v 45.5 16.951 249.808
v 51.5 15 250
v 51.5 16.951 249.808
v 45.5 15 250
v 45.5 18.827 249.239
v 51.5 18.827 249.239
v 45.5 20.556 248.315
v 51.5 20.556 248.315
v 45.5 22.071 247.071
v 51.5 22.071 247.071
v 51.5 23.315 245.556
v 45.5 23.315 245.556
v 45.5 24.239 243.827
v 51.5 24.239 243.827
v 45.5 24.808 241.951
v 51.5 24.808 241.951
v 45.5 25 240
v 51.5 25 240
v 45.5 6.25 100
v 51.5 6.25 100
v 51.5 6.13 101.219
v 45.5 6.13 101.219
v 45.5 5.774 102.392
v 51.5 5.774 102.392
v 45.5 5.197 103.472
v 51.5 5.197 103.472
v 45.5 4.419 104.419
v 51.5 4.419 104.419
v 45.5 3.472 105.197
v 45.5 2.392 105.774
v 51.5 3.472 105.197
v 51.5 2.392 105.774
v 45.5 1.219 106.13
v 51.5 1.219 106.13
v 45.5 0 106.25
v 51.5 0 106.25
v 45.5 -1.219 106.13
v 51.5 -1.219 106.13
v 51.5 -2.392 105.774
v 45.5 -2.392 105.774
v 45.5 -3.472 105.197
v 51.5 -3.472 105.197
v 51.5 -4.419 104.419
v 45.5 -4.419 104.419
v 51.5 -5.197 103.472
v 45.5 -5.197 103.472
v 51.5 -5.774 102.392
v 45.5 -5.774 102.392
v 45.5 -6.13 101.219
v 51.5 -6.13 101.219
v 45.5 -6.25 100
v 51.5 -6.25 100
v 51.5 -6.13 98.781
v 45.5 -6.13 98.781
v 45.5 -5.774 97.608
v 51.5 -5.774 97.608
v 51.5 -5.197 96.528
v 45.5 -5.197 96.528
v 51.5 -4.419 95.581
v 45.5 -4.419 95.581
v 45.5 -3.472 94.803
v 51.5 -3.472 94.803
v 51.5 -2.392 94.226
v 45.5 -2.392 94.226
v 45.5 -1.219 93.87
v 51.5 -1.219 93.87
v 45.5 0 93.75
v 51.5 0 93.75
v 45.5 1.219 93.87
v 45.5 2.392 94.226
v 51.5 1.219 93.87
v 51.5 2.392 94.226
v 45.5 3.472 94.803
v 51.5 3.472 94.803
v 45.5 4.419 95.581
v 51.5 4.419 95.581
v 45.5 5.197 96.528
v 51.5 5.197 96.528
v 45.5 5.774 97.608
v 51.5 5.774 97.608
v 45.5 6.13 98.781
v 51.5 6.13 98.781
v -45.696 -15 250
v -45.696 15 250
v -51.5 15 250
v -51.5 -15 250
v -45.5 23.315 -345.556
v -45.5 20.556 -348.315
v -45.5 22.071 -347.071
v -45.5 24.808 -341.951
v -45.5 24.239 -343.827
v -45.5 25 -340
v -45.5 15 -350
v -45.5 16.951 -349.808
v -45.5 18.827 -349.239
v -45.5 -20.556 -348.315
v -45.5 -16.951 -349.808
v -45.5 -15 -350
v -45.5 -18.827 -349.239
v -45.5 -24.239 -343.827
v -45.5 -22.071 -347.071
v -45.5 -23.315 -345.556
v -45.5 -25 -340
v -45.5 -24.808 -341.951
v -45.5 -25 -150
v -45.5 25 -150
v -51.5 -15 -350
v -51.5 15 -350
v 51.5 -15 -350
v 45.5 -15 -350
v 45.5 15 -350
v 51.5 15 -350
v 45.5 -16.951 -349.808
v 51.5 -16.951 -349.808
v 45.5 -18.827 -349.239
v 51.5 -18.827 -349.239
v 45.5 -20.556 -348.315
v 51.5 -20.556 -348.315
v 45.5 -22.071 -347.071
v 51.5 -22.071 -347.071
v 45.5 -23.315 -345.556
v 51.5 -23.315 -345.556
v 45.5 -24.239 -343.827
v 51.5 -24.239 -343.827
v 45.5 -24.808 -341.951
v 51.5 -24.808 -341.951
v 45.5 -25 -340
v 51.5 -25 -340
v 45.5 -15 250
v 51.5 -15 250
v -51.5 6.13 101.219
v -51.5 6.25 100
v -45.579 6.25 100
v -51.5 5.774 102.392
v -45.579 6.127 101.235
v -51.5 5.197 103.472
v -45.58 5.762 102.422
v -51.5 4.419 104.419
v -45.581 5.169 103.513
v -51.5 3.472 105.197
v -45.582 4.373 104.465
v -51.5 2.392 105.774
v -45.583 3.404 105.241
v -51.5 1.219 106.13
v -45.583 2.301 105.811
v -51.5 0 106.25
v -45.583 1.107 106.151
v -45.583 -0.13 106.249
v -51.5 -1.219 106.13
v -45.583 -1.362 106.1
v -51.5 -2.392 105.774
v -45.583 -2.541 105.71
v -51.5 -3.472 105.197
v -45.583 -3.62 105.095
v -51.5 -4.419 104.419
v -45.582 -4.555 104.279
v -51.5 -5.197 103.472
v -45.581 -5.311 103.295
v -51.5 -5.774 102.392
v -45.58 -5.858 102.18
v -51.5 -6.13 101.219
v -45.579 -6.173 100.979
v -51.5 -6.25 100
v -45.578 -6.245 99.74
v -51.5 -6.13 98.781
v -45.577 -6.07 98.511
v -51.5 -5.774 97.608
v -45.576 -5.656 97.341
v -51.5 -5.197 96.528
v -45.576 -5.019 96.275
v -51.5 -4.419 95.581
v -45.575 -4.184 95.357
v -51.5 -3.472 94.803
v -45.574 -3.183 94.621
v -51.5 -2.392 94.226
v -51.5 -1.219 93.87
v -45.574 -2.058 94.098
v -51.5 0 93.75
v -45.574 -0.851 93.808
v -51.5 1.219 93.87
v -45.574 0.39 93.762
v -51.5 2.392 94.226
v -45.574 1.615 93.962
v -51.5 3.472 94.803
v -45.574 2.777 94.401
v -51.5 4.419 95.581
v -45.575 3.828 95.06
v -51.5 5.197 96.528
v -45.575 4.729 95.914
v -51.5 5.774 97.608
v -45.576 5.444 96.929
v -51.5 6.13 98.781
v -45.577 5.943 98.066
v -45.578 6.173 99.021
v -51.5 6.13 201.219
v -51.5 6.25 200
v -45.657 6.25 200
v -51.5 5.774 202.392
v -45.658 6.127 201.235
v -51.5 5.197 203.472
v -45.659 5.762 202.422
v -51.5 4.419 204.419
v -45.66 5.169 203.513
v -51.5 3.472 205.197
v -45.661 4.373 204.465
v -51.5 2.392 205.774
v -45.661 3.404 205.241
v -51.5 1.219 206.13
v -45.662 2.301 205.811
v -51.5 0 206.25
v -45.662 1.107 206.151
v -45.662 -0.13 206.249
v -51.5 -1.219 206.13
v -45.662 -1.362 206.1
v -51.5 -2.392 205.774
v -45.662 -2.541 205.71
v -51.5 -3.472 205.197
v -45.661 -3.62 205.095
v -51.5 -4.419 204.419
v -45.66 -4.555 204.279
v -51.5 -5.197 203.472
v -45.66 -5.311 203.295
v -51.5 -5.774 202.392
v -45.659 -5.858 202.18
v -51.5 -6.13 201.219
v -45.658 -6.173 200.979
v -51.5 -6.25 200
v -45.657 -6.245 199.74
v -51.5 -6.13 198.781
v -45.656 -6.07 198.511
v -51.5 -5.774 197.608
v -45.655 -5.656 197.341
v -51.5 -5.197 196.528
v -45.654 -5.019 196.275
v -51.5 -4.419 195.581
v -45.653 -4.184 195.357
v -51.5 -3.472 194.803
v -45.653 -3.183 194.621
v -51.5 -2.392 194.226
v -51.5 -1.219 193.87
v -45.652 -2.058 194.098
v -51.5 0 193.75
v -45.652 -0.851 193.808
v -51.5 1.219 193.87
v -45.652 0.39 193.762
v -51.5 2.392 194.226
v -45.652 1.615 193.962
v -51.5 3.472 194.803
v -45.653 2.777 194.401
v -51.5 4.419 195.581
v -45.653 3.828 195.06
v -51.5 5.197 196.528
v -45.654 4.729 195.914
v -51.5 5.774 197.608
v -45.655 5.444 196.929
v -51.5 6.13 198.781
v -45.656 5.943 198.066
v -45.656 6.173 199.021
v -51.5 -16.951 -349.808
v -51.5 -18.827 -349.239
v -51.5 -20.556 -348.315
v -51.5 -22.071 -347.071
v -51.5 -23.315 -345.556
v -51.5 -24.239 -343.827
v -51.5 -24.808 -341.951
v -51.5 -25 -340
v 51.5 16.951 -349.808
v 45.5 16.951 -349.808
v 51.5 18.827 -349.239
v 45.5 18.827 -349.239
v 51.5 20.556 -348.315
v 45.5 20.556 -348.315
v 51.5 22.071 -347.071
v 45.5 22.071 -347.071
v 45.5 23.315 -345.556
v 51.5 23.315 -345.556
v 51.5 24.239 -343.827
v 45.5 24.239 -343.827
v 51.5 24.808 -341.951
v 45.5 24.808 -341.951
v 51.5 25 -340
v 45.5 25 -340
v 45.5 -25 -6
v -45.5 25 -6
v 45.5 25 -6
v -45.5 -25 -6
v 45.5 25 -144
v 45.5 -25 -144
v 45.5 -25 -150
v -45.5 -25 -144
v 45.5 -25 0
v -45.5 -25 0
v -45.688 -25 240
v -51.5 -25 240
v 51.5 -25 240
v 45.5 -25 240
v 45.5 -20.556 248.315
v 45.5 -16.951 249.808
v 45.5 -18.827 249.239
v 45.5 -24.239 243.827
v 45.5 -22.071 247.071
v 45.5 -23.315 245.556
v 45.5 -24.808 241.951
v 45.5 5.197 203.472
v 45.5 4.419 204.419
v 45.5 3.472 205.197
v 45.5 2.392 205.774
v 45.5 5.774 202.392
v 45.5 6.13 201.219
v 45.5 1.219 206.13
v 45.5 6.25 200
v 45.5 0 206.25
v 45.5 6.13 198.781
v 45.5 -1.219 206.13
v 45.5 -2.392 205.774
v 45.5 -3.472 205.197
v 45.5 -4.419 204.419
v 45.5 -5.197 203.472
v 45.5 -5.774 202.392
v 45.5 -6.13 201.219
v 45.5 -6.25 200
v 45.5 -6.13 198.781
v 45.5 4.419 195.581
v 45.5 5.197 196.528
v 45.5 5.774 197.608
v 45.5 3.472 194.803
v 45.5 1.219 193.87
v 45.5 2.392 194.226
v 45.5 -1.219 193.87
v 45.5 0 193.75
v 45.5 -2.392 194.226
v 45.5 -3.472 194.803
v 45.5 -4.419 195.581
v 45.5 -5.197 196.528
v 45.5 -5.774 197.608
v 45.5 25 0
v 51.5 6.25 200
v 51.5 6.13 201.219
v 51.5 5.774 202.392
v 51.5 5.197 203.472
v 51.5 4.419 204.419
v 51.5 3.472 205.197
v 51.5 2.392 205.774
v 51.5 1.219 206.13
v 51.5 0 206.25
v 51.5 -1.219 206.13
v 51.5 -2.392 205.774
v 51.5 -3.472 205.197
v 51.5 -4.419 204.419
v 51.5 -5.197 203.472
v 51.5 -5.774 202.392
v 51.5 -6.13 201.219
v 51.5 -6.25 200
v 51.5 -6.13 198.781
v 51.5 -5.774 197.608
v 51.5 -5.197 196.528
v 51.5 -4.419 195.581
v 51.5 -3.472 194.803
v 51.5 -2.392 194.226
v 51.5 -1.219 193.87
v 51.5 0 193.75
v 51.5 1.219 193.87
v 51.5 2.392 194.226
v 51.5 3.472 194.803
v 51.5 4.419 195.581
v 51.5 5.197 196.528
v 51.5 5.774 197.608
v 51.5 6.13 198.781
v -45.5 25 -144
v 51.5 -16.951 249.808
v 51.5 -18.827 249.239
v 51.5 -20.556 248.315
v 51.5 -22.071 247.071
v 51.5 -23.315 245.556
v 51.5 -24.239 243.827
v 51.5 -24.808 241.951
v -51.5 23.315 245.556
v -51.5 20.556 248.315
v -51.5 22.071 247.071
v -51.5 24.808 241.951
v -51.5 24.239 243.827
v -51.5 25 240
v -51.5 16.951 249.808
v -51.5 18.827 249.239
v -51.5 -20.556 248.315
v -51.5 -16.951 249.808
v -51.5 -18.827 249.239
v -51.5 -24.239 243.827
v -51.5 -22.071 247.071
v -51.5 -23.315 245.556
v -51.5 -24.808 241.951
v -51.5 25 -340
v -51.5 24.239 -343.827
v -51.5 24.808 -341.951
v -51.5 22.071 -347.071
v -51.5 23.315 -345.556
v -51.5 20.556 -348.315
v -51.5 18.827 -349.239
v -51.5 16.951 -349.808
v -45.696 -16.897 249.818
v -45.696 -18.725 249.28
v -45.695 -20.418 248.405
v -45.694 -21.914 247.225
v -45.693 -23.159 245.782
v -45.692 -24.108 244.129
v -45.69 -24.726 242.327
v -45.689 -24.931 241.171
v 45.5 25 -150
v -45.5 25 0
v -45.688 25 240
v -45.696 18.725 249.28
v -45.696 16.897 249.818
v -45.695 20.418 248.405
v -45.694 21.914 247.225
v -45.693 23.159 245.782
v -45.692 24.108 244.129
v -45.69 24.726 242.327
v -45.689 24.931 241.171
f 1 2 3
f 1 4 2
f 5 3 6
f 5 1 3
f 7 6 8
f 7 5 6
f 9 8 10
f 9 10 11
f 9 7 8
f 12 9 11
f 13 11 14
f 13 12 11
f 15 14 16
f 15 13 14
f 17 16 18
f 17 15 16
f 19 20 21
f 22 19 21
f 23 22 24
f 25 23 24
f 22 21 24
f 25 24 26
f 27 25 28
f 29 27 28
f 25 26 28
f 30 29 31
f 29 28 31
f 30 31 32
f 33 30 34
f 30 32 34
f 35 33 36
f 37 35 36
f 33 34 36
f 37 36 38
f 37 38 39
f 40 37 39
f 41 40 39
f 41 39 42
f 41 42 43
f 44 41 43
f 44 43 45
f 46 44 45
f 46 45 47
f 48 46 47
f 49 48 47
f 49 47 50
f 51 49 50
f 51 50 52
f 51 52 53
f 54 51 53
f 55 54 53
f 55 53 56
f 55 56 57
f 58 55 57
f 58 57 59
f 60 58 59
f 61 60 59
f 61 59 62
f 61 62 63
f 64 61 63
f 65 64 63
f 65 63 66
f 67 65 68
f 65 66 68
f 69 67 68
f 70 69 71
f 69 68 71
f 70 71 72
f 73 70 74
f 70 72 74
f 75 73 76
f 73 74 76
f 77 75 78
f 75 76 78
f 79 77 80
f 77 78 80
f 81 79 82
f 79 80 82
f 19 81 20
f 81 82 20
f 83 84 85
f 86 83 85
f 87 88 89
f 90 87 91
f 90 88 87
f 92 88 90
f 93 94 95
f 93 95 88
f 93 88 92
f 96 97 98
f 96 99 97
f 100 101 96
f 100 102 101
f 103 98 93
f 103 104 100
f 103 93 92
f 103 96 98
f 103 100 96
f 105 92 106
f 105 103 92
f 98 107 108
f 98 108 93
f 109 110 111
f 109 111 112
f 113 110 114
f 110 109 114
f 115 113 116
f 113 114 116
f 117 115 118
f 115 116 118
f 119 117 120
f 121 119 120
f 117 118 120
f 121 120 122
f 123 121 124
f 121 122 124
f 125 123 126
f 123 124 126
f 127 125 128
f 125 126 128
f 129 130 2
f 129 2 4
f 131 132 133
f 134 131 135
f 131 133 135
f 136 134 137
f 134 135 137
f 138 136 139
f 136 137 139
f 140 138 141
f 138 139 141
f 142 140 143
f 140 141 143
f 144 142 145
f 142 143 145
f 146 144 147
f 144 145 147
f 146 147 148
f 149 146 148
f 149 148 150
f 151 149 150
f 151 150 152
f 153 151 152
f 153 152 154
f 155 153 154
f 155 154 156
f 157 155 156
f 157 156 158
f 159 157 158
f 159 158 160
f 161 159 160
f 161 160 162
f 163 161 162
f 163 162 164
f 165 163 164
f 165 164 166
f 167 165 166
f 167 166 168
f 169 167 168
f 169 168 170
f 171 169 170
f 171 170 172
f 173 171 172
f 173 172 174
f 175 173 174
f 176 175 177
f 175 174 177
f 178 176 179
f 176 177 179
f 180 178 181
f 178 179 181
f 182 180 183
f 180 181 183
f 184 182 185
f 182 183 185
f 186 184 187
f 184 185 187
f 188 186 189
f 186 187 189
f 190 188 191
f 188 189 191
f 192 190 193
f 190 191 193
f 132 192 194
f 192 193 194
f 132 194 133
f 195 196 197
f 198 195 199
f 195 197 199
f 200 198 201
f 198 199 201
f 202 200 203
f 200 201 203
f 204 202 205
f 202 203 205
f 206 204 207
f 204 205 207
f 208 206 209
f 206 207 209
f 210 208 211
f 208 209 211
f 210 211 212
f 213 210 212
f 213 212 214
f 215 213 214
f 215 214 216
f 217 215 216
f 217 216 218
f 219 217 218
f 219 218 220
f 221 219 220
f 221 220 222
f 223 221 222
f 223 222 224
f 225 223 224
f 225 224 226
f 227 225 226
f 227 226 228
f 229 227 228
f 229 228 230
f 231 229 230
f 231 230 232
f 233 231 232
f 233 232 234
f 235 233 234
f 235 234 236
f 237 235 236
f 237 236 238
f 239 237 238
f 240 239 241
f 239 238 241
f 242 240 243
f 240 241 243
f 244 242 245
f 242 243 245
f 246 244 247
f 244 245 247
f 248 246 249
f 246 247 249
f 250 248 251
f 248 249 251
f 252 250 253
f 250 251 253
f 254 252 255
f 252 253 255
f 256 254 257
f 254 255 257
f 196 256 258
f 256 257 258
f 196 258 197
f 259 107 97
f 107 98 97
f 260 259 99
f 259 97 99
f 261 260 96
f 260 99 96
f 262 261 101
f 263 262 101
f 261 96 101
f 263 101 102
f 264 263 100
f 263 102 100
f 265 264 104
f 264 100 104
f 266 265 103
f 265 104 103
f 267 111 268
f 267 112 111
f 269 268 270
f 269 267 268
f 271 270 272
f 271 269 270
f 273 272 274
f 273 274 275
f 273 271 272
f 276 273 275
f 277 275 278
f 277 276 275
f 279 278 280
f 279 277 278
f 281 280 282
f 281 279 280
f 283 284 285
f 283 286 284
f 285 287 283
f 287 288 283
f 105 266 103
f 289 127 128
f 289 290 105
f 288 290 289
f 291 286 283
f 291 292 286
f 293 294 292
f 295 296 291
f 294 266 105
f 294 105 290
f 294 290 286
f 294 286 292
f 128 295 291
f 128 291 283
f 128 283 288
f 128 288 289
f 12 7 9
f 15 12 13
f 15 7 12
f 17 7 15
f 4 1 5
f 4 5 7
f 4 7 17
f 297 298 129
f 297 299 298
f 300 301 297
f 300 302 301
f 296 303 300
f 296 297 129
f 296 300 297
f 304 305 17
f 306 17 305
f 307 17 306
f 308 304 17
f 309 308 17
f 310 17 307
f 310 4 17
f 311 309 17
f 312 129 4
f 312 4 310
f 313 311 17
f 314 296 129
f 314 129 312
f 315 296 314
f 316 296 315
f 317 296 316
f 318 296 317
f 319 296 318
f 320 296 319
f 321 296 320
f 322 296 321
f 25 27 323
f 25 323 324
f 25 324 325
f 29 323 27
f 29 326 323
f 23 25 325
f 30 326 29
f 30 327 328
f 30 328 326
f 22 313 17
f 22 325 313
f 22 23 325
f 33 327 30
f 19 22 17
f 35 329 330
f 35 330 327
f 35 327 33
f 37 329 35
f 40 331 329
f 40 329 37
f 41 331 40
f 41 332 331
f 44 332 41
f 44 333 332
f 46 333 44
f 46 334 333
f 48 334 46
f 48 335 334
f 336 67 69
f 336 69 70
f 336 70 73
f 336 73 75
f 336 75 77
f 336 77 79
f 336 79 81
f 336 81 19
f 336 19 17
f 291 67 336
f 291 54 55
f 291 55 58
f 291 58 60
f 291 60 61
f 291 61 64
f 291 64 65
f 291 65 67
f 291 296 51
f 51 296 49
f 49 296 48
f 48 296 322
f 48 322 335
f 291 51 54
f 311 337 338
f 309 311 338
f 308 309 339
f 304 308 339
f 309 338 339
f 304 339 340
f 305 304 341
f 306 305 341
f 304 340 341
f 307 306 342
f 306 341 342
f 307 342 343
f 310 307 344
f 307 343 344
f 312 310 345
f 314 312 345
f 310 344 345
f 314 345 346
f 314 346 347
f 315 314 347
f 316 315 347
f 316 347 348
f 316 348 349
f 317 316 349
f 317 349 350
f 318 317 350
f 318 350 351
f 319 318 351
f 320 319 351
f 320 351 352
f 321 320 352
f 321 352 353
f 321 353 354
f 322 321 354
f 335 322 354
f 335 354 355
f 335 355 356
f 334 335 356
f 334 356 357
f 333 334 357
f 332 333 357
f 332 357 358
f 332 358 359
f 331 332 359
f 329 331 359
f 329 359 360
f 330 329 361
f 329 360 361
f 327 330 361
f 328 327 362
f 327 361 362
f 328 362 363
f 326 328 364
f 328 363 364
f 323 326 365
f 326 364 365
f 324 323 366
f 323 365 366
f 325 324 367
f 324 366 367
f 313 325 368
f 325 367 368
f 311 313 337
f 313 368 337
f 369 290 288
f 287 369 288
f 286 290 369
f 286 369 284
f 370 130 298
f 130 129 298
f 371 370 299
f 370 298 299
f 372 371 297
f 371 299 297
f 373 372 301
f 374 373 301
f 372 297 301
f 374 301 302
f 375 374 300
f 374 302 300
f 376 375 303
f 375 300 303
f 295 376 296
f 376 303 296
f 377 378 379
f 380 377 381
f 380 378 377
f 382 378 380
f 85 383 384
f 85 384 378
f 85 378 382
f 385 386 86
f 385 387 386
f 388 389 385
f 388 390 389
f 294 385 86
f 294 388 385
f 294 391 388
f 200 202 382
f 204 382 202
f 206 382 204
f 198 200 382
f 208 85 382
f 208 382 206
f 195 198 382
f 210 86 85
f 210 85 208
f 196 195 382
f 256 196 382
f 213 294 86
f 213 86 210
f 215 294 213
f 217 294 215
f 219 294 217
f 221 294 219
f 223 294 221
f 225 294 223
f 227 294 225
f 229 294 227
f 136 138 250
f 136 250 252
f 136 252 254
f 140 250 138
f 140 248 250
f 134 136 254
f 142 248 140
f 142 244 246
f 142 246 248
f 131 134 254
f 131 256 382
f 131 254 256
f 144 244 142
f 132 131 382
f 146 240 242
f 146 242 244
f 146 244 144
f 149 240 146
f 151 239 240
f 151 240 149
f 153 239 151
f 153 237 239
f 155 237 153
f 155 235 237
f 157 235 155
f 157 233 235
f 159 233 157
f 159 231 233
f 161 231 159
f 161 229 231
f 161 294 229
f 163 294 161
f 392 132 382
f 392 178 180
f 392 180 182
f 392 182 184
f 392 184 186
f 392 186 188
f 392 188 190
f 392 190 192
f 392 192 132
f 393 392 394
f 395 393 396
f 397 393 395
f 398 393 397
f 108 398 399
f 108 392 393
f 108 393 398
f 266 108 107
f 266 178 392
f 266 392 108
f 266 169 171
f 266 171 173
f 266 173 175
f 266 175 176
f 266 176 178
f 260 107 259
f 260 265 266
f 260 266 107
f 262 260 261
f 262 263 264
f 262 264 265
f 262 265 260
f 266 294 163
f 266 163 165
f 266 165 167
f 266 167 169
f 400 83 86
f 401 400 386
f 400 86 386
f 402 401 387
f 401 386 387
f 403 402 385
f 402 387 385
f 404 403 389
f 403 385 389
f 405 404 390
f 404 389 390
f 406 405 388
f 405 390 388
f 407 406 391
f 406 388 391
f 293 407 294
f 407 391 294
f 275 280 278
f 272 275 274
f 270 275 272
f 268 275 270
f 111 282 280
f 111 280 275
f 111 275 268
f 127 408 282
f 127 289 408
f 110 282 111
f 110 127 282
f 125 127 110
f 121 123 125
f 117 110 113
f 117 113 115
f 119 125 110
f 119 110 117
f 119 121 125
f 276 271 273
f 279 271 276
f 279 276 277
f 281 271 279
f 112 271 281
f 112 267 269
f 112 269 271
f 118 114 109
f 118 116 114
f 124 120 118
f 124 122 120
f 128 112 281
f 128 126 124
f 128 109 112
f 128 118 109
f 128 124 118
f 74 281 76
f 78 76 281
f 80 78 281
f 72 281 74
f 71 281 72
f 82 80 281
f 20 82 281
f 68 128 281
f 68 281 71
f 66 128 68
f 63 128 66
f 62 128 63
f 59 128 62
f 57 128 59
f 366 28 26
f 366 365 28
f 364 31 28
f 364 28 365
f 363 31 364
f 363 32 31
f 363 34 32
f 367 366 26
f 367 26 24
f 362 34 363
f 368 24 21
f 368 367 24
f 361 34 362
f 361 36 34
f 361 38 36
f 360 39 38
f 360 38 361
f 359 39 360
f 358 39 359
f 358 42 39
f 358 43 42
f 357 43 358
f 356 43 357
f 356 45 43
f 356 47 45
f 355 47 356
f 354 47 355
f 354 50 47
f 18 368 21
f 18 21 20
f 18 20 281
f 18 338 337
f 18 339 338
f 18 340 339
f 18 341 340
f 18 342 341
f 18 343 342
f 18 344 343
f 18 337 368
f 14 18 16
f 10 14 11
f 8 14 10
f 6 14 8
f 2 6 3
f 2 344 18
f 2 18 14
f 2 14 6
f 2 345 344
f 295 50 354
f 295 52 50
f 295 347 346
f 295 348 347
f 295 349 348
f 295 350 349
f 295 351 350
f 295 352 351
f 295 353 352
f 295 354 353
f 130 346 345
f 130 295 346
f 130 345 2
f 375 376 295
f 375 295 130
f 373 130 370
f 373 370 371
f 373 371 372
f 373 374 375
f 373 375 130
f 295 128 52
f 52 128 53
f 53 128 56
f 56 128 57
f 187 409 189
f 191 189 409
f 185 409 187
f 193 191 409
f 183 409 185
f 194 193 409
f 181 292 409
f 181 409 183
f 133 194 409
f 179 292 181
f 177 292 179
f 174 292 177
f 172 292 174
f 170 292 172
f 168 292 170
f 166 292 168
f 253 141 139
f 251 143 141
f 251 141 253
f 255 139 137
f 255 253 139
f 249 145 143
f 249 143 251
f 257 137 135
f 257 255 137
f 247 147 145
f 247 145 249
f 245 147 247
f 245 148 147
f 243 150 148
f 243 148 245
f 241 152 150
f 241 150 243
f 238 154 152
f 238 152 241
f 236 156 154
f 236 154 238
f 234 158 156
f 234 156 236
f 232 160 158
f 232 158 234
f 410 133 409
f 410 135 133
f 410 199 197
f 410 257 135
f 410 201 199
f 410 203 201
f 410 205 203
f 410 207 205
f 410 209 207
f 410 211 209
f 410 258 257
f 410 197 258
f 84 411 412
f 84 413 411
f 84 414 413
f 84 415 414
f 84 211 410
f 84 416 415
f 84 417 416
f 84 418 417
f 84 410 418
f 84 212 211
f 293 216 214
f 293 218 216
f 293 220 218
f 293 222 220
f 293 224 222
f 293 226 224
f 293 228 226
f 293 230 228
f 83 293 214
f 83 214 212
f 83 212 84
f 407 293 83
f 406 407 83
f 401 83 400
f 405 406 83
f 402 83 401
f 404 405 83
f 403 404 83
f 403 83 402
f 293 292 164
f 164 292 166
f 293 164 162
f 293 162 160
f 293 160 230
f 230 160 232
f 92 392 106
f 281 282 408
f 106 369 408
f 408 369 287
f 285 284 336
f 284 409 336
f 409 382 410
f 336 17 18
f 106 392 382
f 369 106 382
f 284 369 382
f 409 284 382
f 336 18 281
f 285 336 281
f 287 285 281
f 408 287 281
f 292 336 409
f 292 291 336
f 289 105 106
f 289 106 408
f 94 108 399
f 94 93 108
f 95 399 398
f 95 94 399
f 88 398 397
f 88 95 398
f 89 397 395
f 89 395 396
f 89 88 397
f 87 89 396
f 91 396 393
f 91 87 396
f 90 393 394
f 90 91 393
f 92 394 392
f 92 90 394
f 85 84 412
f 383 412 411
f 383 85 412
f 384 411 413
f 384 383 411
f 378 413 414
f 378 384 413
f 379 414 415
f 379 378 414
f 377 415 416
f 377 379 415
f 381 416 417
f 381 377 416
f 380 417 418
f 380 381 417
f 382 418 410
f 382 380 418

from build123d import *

# Parameters (mm, degrees)
F0_W     = 91
F0_H     = 138
F1_DEPTH = 25
F2_R     = 10
F3_R     = 6.25
F4_DEPTH = 103.001


with BuildPart() as f1:
    # F0 (on Front) → F1 (new body, symmetric)
    with BuildSketch(Plane.XZ):
        Polygon((45.5, 0), (-45.5, 0), (-45.696307, 250), (-51.5, 250), (-51.5, -350), (-45.5, -350), (-45.5, -150), (45.5, -150), (45.5, -350), (51.5, -350), (51.5, 250), (45.5, 250), align=None)
        with Locations((0, -75)):
            Rectangle(F0_W, F0_H, mode=Mode.SUBTRACT)
    extrude(amount=F1_DEPTH, both=True)

    # F2
    f2_edges = [f1.edges().sort_by_distance(p)[0] for p in [
        (48.5, -25, 250),
        (48.5, 25, 250),
        (-48.598153, -25, 250),
        (-48.598153, 25, 250),
        (48.5, -25, -350),
        (-48.5, -25, -350),
        (48.5, 25, -350),
        (-48.5, 25, -350),
    ]]
    fillet(f2_edges, radius=F2_R)

    # F3 (on face) → F4 (cut, through all)
    with BuildSketch(Plane.YZ.offset(51.5)):
        with Locations((0, 200)):
            Circle(F3_R)
        with Locations((0, 100)):
            Circle(F3_R)
    extrude(amount=-F4_DEPTH, mode=Mode.SUBTRACT)


solid = f1.part
